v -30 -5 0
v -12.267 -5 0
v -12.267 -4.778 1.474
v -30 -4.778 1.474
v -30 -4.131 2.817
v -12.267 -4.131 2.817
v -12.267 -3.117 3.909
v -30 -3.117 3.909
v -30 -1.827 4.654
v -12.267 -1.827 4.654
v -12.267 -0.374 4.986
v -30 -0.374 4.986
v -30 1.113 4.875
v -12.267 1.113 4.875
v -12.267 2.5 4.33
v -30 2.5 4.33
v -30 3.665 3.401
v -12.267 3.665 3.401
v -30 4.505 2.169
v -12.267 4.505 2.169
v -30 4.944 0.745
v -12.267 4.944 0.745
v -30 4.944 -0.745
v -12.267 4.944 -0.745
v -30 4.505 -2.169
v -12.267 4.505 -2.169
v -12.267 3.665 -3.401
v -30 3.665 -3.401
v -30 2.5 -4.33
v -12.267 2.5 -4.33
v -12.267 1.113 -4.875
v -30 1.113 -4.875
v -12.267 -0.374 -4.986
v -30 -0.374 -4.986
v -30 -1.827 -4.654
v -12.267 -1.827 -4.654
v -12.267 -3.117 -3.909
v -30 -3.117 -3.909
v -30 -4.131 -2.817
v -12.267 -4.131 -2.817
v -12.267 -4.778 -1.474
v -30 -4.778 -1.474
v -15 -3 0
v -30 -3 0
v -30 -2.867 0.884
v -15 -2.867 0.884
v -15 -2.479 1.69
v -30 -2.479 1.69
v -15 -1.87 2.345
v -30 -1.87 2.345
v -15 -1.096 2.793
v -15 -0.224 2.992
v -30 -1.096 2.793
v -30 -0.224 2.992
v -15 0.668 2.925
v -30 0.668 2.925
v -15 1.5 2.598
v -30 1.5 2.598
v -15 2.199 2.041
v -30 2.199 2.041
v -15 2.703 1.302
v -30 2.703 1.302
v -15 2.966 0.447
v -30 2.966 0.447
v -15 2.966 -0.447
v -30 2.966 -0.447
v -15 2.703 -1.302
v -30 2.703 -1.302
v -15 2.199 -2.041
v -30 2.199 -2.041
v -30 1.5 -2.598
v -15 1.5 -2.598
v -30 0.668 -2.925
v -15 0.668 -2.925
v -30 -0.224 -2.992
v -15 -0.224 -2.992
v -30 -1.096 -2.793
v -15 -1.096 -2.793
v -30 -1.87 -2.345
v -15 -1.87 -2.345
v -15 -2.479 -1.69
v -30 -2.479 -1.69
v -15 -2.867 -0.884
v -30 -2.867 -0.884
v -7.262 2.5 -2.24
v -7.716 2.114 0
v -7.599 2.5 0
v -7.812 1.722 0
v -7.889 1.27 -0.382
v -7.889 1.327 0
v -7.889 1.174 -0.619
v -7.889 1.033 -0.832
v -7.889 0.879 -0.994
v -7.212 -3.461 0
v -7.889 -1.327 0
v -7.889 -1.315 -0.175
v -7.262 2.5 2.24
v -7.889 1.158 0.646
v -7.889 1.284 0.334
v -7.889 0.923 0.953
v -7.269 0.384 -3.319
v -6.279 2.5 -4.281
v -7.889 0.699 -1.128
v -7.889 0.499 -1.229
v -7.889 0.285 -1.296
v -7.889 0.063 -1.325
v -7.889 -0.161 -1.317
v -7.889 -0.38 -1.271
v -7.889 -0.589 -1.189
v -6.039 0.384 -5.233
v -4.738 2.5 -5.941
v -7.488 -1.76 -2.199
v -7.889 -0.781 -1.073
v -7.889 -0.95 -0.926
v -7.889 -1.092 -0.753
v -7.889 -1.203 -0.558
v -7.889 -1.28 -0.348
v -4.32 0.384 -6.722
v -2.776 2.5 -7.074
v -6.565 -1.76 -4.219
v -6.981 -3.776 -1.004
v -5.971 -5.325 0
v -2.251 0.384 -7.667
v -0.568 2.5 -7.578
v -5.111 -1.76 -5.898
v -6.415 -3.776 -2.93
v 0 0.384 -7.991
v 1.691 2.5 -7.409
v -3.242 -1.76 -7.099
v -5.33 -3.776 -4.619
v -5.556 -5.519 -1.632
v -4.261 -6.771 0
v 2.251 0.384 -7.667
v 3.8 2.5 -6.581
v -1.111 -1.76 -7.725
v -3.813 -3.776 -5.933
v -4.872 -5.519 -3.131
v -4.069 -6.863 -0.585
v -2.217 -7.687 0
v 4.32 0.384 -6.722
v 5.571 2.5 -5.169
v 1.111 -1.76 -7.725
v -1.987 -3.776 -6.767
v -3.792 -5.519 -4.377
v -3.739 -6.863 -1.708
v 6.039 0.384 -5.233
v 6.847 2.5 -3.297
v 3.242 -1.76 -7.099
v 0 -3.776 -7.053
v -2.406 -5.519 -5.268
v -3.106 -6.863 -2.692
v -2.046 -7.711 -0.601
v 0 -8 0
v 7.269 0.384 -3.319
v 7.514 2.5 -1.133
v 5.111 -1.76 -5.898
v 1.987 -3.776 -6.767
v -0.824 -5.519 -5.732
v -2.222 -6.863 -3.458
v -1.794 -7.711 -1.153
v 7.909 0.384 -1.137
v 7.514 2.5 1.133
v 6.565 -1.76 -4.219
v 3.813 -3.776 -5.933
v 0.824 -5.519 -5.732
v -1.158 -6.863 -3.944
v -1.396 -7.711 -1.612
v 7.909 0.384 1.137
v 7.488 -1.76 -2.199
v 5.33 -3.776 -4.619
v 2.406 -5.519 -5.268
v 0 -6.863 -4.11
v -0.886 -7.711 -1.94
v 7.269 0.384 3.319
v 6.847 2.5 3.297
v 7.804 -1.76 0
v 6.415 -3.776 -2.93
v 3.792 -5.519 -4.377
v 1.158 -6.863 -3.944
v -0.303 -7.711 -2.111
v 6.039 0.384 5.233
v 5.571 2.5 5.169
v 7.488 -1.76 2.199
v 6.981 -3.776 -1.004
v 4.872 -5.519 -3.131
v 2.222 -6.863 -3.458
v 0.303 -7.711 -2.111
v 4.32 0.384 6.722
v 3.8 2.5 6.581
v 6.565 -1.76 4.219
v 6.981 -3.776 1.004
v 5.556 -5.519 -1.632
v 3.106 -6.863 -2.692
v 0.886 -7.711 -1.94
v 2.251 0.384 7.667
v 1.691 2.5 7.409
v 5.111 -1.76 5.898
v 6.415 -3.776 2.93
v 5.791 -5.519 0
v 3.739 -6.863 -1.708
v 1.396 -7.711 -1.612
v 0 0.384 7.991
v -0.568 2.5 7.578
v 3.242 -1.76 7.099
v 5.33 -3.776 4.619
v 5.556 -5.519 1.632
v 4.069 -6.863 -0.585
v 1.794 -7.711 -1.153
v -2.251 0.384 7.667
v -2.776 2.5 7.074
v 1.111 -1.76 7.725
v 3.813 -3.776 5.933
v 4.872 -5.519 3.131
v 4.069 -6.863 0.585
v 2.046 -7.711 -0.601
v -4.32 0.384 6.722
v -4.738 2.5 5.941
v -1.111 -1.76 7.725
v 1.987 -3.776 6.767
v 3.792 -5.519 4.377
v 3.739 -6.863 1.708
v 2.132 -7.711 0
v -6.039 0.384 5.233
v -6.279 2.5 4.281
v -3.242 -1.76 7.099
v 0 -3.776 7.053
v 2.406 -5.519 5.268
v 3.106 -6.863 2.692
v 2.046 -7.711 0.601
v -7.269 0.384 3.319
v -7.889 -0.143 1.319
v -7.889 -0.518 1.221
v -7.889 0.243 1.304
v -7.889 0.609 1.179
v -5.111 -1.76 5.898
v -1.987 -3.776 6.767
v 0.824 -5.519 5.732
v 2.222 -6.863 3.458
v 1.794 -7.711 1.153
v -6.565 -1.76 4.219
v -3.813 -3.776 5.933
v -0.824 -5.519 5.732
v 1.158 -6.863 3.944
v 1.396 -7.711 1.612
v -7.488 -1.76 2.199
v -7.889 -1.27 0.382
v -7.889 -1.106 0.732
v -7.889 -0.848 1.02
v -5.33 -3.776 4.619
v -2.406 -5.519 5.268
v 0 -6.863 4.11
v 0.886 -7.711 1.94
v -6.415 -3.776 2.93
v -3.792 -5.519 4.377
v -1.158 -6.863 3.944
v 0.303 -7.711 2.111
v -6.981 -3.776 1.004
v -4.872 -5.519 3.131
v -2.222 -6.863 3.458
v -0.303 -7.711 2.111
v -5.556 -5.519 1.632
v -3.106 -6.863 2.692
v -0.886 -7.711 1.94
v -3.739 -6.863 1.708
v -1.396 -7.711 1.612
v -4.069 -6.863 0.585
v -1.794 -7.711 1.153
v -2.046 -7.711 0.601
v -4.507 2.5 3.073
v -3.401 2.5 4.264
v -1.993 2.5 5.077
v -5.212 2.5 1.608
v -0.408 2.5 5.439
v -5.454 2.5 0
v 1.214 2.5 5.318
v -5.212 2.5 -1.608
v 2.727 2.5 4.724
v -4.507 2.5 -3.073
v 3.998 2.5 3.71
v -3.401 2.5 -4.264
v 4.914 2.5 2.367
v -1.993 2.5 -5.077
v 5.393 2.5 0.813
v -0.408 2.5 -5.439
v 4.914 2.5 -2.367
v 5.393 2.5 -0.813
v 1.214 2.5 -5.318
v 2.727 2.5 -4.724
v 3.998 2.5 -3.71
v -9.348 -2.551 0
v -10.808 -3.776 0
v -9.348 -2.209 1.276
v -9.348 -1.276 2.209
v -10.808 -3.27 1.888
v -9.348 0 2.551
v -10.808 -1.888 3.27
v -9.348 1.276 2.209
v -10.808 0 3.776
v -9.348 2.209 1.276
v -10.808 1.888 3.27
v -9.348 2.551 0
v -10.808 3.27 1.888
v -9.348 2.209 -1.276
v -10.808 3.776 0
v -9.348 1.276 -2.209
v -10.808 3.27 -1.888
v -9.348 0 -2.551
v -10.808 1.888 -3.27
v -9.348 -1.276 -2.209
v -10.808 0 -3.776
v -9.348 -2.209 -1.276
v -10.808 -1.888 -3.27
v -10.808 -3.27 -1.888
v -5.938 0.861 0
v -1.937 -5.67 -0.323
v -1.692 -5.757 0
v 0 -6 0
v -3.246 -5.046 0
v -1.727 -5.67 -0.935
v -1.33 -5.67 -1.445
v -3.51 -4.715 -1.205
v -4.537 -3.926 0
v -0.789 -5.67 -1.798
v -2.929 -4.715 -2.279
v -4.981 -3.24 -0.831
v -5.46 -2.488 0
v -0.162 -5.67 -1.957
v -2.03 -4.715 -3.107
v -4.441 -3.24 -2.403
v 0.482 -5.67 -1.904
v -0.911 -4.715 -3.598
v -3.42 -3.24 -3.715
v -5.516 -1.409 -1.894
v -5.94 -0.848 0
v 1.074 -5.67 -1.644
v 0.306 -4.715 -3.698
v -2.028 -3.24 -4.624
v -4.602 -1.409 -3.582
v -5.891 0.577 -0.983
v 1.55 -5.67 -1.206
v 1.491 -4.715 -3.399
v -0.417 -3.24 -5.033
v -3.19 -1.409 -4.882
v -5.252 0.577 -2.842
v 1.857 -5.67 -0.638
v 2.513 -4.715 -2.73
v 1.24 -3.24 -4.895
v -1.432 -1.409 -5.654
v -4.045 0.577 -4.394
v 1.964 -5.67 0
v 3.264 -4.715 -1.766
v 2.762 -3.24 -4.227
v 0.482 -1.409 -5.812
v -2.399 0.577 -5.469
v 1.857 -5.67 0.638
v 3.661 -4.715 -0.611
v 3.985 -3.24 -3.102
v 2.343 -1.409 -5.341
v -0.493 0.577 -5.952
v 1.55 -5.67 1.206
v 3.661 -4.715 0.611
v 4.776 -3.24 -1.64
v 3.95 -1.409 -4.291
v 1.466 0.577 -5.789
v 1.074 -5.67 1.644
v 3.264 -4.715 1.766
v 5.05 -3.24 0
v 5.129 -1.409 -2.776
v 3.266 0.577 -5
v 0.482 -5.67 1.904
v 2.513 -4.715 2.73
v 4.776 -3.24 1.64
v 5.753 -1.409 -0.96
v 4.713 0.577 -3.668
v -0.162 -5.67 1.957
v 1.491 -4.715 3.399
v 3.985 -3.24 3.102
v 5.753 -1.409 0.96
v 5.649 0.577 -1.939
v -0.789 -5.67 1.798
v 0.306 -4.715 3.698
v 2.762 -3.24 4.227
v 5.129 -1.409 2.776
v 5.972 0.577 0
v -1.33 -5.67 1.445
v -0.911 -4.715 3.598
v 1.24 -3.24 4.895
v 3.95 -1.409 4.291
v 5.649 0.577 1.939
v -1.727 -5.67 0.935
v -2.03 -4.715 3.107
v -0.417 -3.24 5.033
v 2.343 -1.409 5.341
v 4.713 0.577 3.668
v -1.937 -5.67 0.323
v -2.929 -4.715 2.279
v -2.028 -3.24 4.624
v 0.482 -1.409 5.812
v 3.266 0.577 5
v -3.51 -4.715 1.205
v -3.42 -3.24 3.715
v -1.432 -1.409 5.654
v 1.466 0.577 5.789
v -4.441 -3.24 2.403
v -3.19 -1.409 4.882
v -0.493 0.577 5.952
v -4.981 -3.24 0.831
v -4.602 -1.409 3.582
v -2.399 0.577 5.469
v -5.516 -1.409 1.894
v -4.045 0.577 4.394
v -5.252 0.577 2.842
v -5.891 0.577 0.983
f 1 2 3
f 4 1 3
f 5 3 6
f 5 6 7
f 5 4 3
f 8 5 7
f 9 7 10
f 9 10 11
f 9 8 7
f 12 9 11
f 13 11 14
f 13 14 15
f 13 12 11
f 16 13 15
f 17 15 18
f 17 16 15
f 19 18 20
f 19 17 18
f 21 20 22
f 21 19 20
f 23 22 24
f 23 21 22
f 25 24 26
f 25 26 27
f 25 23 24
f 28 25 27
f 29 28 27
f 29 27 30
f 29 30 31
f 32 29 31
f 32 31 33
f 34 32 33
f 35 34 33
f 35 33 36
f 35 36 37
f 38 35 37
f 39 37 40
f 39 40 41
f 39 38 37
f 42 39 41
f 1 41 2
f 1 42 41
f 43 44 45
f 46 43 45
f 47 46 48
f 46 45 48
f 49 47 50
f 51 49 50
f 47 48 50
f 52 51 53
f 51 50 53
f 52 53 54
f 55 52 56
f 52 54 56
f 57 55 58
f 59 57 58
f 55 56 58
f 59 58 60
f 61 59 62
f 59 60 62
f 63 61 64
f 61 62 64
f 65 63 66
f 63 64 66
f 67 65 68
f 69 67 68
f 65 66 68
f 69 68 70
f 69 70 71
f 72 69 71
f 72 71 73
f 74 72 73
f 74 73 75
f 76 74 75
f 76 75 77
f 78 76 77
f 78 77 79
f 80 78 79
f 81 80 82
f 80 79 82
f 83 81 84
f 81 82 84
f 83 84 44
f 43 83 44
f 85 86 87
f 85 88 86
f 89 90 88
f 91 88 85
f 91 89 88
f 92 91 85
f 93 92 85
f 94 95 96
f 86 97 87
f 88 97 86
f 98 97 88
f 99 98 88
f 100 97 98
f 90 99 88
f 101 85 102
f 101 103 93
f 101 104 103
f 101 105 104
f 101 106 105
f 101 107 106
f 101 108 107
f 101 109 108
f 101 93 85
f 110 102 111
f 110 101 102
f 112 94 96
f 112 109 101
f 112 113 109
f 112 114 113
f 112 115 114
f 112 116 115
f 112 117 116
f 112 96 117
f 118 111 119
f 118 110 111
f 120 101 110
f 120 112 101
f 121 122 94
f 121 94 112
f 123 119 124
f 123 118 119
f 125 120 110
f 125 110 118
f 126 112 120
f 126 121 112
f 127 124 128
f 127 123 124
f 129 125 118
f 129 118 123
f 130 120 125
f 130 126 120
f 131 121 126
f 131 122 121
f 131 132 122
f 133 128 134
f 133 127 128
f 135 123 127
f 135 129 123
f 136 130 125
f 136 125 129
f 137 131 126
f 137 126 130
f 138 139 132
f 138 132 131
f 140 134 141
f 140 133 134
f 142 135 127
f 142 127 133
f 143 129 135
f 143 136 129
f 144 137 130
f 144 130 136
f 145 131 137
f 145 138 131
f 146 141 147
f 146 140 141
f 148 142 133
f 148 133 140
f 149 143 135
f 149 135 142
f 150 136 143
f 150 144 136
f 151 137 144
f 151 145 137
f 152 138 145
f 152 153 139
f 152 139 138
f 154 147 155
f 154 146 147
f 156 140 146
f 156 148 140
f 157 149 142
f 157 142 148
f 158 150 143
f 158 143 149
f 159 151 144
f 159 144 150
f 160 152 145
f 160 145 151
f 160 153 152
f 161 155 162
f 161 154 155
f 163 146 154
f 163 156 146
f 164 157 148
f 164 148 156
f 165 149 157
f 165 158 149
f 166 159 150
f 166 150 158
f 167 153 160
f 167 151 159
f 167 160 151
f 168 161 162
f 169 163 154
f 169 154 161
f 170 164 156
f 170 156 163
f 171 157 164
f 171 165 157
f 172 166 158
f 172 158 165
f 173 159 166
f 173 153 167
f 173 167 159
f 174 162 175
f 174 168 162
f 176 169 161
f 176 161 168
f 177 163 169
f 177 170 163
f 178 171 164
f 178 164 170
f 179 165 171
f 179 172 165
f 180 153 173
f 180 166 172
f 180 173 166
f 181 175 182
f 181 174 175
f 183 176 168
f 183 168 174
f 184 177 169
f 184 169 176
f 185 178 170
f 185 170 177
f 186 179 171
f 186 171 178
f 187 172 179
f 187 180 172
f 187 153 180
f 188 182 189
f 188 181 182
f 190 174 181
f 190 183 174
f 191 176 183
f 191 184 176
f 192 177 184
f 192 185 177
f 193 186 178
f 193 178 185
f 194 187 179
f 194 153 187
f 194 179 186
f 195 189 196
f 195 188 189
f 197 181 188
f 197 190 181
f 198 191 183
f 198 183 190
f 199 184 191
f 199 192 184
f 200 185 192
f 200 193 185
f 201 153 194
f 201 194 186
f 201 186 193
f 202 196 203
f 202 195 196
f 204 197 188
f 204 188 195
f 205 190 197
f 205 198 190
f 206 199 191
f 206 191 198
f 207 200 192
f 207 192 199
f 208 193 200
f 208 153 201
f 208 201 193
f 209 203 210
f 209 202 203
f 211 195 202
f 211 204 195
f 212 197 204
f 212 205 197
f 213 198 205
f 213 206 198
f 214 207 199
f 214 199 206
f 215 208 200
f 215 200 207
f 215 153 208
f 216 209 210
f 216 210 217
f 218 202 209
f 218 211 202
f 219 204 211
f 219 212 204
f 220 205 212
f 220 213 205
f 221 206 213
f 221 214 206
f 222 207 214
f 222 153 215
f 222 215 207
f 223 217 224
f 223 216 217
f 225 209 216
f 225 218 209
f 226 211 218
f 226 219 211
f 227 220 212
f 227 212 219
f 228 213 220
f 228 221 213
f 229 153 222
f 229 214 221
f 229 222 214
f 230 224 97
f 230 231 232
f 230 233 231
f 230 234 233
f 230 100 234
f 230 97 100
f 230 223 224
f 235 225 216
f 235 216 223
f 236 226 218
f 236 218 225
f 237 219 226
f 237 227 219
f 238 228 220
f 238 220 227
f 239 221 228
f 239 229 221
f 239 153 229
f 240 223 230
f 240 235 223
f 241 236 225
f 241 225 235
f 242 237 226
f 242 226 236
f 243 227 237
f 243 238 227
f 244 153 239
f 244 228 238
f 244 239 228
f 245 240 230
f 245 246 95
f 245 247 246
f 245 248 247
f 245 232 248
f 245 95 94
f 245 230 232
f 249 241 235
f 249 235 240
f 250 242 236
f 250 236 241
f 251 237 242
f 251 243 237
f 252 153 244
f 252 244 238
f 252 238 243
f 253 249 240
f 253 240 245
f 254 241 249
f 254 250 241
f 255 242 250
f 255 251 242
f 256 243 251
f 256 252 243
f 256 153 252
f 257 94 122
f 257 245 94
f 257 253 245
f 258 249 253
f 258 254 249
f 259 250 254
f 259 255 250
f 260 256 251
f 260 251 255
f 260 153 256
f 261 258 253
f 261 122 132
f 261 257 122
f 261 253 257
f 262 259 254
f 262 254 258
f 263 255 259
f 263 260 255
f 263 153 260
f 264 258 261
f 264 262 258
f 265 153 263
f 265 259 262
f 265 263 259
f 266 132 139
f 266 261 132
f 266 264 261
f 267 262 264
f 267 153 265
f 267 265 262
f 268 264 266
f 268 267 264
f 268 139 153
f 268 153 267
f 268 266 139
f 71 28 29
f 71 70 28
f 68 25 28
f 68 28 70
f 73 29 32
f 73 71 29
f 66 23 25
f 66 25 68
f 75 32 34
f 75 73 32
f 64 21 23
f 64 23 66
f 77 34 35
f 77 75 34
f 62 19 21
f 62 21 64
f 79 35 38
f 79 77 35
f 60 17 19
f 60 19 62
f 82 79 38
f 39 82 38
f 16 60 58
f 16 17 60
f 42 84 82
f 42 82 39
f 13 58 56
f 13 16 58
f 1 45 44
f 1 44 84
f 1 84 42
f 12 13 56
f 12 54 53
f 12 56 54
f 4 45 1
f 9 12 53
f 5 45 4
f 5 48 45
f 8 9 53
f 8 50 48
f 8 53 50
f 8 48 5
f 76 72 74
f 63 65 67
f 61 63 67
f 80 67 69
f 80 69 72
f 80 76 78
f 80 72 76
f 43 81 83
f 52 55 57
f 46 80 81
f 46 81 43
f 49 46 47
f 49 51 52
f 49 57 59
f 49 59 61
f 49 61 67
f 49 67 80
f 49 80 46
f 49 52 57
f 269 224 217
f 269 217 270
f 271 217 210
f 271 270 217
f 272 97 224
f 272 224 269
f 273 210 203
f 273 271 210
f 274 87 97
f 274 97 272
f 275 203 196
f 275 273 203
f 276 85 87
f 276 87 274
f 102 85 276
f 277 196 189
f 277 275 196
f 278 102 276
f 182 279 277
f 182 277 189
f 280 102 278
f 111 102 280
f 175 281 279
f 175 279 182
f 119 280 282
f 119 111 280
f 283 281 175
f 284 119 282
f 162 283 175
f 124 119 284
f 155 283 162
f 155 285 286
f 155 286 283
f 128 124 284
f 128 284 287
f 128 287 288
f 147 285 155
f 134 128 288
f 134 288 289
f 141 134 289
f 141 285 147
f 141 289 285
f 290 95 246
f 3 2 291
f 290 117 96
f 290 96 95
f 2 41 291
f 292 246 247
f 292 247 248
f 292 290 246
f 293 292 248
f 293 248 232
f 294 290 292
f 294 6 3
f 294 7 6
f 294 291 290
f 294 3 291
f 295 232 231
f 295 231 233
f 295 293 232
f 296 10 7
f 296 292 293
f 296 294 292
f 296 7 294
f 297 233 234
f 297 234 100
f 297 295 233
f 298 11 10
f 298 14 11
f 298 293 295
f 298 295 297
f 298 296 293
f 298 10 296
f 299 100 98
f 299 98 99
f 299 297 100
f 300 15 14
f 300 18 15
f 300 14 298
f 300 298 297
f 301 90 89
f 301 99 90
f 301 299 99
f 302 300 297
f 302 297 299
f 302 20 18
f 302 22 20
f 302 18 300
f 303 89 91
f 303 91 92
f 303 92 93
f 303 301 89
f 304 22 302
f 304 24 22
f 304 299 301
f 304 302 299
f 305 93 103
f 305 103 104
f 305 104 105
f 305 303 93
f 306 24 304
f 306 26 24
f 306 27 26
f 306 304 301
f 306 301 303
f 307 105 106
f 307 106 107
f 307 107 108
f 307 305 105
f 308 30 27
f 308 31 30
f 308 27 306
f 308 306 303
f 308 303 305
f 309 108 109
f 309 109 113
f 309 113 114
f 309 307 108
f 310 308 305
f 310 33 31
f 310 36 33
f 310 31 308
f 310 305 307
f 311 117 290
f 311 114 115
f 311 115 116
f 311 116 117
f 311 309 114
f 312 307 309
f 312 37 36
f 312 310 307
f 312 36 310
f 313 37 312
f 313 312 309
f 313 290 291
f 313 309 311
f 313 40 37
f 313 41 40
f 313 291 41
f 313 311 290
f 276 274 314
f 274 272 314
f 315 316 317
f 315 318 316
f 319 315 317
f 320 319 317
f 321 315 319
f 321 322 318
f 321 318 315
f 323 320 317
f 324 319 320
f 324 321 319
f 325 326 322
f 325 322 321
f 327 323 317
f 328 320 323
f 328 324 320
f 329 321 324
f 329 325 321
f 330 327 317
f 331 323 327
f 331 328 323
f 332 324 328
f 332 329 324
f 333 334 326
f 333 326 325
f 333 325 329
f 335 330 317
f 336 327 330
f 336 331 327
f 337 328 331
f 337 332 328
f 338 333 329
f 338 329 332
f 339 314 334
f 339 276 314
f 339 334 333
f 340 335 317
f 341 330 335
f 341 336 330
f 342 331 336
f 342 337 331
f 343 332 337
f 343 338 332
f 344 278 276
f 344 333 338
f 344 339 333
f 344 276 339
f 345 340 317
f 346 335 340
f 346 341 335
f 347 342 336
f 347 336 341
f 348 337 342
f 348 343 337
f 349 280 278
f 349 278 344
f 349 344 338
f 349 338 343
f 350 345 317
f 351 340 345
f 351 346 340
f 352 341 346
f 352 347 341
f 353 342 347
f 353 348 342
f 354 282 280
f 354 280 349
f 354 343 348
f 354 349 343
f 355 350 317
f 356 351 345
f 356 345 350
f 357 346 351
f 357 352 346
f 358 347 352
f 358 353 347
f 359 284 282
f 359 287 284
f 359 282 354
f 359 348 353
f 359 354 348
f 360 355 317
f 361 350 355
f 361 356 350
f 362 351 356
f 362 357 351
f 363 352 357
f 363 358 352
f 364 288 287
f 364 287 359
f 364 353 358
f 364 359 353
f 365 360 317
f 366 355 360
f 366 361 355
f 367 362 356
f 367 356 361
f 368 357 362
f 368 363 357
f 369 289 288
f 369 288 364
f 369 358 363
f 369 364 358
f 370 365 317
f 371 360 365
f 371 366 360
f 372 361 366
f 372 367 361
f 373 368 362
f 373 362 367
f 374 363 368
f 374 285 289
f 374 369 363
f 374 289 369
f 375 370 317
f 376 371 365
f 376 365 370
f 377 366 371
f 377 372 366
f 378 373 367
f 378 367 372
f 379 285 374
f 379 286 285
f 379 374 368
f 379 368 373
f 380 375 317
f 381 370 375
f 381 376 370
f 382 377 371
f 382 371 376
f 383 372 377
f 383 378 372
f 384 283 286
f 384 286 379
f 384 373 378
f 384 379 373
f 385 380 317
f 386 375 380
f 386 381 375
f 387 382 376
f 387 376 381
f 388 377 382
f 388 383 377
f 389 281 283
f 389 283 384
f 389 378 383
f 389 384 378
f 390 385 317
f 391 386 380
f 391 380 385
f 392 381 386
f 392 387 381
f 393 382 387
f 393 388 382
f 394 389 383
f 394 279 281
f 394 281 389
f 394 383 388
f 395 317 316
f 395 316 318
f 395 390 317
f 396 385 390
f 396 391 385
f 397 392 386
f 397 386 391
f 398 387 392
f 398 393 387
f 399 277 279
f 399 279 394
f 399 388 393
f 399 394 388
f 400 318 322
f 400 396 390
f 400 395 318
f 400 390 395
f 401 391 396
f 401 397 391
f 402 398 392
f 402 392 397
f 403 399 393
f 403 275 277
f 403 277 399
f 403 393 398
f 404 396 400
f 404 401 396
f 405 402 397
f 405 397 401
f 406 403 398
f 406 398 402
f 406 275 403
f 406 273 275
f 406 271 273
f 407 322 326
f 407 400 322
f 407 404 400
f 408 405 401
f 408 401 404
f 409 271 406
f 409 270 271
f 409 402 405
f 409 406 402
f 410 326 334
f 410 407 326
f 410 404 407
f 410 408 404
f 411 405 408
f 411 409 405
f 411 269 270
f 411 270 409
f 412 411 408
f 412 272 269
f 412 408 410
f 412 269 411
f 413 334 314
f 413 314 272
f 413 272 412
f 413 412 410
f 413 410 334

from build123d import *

# Parameters (mm, degrees)
SKETCH_4_R          = 3
CUT_EXTRUDE_1_DEPTH = 15


with BuildPart() as part:
    # 草图1 → 旋转1 (revolve)
    with BuildSketch(Plane.XY):
        with BuildLine():
            Line((-5.454356057, 2.5), (-7.599342077, 2.5))
            ThreePointArc((-7.599342077, 2.5), (-6.480740698, -4.69041576), (0, -8))
            Line((0, -8), (0, -6))
            ThreePointArc((0, -6), (-5.049752469, -3.240370349), (-5.454356057, 2.5))
        make_face()
    revolve(axis=Axis((0, 0, 0), (0, -1, 0)))

    # 草图2 → 旋转2 (revolve)
    with BuildSketch(Plane.XY, mode=Mode.PRIVATE) as revolve_2_sk:
        Polygon((-7.5, 0), (-7.5, 1), (-12.26701437, 5), (-30, 5), (-30, 0), align=None)
    revolve(revolve_2_sk.sketch.rotate(Axis((-7.5, 0, 0), (-1, 0, 0)), 180), axis=Axis((-7.5, 0, 0), (-1, 0, 0)))

    # 草图4 → 切除-拉伸1 (cut)
    with BuildSketch(Plane.ZY.offset(30)):
        with Locations(Location((0, 0, 0), (0, 0, 270))):
            Circle(SKETCH_4_R)
    extrude(amount=-CUT_EXTRUDE_1_DEPTH, mode=Mode.SUBTRACT)


solid = part.part
